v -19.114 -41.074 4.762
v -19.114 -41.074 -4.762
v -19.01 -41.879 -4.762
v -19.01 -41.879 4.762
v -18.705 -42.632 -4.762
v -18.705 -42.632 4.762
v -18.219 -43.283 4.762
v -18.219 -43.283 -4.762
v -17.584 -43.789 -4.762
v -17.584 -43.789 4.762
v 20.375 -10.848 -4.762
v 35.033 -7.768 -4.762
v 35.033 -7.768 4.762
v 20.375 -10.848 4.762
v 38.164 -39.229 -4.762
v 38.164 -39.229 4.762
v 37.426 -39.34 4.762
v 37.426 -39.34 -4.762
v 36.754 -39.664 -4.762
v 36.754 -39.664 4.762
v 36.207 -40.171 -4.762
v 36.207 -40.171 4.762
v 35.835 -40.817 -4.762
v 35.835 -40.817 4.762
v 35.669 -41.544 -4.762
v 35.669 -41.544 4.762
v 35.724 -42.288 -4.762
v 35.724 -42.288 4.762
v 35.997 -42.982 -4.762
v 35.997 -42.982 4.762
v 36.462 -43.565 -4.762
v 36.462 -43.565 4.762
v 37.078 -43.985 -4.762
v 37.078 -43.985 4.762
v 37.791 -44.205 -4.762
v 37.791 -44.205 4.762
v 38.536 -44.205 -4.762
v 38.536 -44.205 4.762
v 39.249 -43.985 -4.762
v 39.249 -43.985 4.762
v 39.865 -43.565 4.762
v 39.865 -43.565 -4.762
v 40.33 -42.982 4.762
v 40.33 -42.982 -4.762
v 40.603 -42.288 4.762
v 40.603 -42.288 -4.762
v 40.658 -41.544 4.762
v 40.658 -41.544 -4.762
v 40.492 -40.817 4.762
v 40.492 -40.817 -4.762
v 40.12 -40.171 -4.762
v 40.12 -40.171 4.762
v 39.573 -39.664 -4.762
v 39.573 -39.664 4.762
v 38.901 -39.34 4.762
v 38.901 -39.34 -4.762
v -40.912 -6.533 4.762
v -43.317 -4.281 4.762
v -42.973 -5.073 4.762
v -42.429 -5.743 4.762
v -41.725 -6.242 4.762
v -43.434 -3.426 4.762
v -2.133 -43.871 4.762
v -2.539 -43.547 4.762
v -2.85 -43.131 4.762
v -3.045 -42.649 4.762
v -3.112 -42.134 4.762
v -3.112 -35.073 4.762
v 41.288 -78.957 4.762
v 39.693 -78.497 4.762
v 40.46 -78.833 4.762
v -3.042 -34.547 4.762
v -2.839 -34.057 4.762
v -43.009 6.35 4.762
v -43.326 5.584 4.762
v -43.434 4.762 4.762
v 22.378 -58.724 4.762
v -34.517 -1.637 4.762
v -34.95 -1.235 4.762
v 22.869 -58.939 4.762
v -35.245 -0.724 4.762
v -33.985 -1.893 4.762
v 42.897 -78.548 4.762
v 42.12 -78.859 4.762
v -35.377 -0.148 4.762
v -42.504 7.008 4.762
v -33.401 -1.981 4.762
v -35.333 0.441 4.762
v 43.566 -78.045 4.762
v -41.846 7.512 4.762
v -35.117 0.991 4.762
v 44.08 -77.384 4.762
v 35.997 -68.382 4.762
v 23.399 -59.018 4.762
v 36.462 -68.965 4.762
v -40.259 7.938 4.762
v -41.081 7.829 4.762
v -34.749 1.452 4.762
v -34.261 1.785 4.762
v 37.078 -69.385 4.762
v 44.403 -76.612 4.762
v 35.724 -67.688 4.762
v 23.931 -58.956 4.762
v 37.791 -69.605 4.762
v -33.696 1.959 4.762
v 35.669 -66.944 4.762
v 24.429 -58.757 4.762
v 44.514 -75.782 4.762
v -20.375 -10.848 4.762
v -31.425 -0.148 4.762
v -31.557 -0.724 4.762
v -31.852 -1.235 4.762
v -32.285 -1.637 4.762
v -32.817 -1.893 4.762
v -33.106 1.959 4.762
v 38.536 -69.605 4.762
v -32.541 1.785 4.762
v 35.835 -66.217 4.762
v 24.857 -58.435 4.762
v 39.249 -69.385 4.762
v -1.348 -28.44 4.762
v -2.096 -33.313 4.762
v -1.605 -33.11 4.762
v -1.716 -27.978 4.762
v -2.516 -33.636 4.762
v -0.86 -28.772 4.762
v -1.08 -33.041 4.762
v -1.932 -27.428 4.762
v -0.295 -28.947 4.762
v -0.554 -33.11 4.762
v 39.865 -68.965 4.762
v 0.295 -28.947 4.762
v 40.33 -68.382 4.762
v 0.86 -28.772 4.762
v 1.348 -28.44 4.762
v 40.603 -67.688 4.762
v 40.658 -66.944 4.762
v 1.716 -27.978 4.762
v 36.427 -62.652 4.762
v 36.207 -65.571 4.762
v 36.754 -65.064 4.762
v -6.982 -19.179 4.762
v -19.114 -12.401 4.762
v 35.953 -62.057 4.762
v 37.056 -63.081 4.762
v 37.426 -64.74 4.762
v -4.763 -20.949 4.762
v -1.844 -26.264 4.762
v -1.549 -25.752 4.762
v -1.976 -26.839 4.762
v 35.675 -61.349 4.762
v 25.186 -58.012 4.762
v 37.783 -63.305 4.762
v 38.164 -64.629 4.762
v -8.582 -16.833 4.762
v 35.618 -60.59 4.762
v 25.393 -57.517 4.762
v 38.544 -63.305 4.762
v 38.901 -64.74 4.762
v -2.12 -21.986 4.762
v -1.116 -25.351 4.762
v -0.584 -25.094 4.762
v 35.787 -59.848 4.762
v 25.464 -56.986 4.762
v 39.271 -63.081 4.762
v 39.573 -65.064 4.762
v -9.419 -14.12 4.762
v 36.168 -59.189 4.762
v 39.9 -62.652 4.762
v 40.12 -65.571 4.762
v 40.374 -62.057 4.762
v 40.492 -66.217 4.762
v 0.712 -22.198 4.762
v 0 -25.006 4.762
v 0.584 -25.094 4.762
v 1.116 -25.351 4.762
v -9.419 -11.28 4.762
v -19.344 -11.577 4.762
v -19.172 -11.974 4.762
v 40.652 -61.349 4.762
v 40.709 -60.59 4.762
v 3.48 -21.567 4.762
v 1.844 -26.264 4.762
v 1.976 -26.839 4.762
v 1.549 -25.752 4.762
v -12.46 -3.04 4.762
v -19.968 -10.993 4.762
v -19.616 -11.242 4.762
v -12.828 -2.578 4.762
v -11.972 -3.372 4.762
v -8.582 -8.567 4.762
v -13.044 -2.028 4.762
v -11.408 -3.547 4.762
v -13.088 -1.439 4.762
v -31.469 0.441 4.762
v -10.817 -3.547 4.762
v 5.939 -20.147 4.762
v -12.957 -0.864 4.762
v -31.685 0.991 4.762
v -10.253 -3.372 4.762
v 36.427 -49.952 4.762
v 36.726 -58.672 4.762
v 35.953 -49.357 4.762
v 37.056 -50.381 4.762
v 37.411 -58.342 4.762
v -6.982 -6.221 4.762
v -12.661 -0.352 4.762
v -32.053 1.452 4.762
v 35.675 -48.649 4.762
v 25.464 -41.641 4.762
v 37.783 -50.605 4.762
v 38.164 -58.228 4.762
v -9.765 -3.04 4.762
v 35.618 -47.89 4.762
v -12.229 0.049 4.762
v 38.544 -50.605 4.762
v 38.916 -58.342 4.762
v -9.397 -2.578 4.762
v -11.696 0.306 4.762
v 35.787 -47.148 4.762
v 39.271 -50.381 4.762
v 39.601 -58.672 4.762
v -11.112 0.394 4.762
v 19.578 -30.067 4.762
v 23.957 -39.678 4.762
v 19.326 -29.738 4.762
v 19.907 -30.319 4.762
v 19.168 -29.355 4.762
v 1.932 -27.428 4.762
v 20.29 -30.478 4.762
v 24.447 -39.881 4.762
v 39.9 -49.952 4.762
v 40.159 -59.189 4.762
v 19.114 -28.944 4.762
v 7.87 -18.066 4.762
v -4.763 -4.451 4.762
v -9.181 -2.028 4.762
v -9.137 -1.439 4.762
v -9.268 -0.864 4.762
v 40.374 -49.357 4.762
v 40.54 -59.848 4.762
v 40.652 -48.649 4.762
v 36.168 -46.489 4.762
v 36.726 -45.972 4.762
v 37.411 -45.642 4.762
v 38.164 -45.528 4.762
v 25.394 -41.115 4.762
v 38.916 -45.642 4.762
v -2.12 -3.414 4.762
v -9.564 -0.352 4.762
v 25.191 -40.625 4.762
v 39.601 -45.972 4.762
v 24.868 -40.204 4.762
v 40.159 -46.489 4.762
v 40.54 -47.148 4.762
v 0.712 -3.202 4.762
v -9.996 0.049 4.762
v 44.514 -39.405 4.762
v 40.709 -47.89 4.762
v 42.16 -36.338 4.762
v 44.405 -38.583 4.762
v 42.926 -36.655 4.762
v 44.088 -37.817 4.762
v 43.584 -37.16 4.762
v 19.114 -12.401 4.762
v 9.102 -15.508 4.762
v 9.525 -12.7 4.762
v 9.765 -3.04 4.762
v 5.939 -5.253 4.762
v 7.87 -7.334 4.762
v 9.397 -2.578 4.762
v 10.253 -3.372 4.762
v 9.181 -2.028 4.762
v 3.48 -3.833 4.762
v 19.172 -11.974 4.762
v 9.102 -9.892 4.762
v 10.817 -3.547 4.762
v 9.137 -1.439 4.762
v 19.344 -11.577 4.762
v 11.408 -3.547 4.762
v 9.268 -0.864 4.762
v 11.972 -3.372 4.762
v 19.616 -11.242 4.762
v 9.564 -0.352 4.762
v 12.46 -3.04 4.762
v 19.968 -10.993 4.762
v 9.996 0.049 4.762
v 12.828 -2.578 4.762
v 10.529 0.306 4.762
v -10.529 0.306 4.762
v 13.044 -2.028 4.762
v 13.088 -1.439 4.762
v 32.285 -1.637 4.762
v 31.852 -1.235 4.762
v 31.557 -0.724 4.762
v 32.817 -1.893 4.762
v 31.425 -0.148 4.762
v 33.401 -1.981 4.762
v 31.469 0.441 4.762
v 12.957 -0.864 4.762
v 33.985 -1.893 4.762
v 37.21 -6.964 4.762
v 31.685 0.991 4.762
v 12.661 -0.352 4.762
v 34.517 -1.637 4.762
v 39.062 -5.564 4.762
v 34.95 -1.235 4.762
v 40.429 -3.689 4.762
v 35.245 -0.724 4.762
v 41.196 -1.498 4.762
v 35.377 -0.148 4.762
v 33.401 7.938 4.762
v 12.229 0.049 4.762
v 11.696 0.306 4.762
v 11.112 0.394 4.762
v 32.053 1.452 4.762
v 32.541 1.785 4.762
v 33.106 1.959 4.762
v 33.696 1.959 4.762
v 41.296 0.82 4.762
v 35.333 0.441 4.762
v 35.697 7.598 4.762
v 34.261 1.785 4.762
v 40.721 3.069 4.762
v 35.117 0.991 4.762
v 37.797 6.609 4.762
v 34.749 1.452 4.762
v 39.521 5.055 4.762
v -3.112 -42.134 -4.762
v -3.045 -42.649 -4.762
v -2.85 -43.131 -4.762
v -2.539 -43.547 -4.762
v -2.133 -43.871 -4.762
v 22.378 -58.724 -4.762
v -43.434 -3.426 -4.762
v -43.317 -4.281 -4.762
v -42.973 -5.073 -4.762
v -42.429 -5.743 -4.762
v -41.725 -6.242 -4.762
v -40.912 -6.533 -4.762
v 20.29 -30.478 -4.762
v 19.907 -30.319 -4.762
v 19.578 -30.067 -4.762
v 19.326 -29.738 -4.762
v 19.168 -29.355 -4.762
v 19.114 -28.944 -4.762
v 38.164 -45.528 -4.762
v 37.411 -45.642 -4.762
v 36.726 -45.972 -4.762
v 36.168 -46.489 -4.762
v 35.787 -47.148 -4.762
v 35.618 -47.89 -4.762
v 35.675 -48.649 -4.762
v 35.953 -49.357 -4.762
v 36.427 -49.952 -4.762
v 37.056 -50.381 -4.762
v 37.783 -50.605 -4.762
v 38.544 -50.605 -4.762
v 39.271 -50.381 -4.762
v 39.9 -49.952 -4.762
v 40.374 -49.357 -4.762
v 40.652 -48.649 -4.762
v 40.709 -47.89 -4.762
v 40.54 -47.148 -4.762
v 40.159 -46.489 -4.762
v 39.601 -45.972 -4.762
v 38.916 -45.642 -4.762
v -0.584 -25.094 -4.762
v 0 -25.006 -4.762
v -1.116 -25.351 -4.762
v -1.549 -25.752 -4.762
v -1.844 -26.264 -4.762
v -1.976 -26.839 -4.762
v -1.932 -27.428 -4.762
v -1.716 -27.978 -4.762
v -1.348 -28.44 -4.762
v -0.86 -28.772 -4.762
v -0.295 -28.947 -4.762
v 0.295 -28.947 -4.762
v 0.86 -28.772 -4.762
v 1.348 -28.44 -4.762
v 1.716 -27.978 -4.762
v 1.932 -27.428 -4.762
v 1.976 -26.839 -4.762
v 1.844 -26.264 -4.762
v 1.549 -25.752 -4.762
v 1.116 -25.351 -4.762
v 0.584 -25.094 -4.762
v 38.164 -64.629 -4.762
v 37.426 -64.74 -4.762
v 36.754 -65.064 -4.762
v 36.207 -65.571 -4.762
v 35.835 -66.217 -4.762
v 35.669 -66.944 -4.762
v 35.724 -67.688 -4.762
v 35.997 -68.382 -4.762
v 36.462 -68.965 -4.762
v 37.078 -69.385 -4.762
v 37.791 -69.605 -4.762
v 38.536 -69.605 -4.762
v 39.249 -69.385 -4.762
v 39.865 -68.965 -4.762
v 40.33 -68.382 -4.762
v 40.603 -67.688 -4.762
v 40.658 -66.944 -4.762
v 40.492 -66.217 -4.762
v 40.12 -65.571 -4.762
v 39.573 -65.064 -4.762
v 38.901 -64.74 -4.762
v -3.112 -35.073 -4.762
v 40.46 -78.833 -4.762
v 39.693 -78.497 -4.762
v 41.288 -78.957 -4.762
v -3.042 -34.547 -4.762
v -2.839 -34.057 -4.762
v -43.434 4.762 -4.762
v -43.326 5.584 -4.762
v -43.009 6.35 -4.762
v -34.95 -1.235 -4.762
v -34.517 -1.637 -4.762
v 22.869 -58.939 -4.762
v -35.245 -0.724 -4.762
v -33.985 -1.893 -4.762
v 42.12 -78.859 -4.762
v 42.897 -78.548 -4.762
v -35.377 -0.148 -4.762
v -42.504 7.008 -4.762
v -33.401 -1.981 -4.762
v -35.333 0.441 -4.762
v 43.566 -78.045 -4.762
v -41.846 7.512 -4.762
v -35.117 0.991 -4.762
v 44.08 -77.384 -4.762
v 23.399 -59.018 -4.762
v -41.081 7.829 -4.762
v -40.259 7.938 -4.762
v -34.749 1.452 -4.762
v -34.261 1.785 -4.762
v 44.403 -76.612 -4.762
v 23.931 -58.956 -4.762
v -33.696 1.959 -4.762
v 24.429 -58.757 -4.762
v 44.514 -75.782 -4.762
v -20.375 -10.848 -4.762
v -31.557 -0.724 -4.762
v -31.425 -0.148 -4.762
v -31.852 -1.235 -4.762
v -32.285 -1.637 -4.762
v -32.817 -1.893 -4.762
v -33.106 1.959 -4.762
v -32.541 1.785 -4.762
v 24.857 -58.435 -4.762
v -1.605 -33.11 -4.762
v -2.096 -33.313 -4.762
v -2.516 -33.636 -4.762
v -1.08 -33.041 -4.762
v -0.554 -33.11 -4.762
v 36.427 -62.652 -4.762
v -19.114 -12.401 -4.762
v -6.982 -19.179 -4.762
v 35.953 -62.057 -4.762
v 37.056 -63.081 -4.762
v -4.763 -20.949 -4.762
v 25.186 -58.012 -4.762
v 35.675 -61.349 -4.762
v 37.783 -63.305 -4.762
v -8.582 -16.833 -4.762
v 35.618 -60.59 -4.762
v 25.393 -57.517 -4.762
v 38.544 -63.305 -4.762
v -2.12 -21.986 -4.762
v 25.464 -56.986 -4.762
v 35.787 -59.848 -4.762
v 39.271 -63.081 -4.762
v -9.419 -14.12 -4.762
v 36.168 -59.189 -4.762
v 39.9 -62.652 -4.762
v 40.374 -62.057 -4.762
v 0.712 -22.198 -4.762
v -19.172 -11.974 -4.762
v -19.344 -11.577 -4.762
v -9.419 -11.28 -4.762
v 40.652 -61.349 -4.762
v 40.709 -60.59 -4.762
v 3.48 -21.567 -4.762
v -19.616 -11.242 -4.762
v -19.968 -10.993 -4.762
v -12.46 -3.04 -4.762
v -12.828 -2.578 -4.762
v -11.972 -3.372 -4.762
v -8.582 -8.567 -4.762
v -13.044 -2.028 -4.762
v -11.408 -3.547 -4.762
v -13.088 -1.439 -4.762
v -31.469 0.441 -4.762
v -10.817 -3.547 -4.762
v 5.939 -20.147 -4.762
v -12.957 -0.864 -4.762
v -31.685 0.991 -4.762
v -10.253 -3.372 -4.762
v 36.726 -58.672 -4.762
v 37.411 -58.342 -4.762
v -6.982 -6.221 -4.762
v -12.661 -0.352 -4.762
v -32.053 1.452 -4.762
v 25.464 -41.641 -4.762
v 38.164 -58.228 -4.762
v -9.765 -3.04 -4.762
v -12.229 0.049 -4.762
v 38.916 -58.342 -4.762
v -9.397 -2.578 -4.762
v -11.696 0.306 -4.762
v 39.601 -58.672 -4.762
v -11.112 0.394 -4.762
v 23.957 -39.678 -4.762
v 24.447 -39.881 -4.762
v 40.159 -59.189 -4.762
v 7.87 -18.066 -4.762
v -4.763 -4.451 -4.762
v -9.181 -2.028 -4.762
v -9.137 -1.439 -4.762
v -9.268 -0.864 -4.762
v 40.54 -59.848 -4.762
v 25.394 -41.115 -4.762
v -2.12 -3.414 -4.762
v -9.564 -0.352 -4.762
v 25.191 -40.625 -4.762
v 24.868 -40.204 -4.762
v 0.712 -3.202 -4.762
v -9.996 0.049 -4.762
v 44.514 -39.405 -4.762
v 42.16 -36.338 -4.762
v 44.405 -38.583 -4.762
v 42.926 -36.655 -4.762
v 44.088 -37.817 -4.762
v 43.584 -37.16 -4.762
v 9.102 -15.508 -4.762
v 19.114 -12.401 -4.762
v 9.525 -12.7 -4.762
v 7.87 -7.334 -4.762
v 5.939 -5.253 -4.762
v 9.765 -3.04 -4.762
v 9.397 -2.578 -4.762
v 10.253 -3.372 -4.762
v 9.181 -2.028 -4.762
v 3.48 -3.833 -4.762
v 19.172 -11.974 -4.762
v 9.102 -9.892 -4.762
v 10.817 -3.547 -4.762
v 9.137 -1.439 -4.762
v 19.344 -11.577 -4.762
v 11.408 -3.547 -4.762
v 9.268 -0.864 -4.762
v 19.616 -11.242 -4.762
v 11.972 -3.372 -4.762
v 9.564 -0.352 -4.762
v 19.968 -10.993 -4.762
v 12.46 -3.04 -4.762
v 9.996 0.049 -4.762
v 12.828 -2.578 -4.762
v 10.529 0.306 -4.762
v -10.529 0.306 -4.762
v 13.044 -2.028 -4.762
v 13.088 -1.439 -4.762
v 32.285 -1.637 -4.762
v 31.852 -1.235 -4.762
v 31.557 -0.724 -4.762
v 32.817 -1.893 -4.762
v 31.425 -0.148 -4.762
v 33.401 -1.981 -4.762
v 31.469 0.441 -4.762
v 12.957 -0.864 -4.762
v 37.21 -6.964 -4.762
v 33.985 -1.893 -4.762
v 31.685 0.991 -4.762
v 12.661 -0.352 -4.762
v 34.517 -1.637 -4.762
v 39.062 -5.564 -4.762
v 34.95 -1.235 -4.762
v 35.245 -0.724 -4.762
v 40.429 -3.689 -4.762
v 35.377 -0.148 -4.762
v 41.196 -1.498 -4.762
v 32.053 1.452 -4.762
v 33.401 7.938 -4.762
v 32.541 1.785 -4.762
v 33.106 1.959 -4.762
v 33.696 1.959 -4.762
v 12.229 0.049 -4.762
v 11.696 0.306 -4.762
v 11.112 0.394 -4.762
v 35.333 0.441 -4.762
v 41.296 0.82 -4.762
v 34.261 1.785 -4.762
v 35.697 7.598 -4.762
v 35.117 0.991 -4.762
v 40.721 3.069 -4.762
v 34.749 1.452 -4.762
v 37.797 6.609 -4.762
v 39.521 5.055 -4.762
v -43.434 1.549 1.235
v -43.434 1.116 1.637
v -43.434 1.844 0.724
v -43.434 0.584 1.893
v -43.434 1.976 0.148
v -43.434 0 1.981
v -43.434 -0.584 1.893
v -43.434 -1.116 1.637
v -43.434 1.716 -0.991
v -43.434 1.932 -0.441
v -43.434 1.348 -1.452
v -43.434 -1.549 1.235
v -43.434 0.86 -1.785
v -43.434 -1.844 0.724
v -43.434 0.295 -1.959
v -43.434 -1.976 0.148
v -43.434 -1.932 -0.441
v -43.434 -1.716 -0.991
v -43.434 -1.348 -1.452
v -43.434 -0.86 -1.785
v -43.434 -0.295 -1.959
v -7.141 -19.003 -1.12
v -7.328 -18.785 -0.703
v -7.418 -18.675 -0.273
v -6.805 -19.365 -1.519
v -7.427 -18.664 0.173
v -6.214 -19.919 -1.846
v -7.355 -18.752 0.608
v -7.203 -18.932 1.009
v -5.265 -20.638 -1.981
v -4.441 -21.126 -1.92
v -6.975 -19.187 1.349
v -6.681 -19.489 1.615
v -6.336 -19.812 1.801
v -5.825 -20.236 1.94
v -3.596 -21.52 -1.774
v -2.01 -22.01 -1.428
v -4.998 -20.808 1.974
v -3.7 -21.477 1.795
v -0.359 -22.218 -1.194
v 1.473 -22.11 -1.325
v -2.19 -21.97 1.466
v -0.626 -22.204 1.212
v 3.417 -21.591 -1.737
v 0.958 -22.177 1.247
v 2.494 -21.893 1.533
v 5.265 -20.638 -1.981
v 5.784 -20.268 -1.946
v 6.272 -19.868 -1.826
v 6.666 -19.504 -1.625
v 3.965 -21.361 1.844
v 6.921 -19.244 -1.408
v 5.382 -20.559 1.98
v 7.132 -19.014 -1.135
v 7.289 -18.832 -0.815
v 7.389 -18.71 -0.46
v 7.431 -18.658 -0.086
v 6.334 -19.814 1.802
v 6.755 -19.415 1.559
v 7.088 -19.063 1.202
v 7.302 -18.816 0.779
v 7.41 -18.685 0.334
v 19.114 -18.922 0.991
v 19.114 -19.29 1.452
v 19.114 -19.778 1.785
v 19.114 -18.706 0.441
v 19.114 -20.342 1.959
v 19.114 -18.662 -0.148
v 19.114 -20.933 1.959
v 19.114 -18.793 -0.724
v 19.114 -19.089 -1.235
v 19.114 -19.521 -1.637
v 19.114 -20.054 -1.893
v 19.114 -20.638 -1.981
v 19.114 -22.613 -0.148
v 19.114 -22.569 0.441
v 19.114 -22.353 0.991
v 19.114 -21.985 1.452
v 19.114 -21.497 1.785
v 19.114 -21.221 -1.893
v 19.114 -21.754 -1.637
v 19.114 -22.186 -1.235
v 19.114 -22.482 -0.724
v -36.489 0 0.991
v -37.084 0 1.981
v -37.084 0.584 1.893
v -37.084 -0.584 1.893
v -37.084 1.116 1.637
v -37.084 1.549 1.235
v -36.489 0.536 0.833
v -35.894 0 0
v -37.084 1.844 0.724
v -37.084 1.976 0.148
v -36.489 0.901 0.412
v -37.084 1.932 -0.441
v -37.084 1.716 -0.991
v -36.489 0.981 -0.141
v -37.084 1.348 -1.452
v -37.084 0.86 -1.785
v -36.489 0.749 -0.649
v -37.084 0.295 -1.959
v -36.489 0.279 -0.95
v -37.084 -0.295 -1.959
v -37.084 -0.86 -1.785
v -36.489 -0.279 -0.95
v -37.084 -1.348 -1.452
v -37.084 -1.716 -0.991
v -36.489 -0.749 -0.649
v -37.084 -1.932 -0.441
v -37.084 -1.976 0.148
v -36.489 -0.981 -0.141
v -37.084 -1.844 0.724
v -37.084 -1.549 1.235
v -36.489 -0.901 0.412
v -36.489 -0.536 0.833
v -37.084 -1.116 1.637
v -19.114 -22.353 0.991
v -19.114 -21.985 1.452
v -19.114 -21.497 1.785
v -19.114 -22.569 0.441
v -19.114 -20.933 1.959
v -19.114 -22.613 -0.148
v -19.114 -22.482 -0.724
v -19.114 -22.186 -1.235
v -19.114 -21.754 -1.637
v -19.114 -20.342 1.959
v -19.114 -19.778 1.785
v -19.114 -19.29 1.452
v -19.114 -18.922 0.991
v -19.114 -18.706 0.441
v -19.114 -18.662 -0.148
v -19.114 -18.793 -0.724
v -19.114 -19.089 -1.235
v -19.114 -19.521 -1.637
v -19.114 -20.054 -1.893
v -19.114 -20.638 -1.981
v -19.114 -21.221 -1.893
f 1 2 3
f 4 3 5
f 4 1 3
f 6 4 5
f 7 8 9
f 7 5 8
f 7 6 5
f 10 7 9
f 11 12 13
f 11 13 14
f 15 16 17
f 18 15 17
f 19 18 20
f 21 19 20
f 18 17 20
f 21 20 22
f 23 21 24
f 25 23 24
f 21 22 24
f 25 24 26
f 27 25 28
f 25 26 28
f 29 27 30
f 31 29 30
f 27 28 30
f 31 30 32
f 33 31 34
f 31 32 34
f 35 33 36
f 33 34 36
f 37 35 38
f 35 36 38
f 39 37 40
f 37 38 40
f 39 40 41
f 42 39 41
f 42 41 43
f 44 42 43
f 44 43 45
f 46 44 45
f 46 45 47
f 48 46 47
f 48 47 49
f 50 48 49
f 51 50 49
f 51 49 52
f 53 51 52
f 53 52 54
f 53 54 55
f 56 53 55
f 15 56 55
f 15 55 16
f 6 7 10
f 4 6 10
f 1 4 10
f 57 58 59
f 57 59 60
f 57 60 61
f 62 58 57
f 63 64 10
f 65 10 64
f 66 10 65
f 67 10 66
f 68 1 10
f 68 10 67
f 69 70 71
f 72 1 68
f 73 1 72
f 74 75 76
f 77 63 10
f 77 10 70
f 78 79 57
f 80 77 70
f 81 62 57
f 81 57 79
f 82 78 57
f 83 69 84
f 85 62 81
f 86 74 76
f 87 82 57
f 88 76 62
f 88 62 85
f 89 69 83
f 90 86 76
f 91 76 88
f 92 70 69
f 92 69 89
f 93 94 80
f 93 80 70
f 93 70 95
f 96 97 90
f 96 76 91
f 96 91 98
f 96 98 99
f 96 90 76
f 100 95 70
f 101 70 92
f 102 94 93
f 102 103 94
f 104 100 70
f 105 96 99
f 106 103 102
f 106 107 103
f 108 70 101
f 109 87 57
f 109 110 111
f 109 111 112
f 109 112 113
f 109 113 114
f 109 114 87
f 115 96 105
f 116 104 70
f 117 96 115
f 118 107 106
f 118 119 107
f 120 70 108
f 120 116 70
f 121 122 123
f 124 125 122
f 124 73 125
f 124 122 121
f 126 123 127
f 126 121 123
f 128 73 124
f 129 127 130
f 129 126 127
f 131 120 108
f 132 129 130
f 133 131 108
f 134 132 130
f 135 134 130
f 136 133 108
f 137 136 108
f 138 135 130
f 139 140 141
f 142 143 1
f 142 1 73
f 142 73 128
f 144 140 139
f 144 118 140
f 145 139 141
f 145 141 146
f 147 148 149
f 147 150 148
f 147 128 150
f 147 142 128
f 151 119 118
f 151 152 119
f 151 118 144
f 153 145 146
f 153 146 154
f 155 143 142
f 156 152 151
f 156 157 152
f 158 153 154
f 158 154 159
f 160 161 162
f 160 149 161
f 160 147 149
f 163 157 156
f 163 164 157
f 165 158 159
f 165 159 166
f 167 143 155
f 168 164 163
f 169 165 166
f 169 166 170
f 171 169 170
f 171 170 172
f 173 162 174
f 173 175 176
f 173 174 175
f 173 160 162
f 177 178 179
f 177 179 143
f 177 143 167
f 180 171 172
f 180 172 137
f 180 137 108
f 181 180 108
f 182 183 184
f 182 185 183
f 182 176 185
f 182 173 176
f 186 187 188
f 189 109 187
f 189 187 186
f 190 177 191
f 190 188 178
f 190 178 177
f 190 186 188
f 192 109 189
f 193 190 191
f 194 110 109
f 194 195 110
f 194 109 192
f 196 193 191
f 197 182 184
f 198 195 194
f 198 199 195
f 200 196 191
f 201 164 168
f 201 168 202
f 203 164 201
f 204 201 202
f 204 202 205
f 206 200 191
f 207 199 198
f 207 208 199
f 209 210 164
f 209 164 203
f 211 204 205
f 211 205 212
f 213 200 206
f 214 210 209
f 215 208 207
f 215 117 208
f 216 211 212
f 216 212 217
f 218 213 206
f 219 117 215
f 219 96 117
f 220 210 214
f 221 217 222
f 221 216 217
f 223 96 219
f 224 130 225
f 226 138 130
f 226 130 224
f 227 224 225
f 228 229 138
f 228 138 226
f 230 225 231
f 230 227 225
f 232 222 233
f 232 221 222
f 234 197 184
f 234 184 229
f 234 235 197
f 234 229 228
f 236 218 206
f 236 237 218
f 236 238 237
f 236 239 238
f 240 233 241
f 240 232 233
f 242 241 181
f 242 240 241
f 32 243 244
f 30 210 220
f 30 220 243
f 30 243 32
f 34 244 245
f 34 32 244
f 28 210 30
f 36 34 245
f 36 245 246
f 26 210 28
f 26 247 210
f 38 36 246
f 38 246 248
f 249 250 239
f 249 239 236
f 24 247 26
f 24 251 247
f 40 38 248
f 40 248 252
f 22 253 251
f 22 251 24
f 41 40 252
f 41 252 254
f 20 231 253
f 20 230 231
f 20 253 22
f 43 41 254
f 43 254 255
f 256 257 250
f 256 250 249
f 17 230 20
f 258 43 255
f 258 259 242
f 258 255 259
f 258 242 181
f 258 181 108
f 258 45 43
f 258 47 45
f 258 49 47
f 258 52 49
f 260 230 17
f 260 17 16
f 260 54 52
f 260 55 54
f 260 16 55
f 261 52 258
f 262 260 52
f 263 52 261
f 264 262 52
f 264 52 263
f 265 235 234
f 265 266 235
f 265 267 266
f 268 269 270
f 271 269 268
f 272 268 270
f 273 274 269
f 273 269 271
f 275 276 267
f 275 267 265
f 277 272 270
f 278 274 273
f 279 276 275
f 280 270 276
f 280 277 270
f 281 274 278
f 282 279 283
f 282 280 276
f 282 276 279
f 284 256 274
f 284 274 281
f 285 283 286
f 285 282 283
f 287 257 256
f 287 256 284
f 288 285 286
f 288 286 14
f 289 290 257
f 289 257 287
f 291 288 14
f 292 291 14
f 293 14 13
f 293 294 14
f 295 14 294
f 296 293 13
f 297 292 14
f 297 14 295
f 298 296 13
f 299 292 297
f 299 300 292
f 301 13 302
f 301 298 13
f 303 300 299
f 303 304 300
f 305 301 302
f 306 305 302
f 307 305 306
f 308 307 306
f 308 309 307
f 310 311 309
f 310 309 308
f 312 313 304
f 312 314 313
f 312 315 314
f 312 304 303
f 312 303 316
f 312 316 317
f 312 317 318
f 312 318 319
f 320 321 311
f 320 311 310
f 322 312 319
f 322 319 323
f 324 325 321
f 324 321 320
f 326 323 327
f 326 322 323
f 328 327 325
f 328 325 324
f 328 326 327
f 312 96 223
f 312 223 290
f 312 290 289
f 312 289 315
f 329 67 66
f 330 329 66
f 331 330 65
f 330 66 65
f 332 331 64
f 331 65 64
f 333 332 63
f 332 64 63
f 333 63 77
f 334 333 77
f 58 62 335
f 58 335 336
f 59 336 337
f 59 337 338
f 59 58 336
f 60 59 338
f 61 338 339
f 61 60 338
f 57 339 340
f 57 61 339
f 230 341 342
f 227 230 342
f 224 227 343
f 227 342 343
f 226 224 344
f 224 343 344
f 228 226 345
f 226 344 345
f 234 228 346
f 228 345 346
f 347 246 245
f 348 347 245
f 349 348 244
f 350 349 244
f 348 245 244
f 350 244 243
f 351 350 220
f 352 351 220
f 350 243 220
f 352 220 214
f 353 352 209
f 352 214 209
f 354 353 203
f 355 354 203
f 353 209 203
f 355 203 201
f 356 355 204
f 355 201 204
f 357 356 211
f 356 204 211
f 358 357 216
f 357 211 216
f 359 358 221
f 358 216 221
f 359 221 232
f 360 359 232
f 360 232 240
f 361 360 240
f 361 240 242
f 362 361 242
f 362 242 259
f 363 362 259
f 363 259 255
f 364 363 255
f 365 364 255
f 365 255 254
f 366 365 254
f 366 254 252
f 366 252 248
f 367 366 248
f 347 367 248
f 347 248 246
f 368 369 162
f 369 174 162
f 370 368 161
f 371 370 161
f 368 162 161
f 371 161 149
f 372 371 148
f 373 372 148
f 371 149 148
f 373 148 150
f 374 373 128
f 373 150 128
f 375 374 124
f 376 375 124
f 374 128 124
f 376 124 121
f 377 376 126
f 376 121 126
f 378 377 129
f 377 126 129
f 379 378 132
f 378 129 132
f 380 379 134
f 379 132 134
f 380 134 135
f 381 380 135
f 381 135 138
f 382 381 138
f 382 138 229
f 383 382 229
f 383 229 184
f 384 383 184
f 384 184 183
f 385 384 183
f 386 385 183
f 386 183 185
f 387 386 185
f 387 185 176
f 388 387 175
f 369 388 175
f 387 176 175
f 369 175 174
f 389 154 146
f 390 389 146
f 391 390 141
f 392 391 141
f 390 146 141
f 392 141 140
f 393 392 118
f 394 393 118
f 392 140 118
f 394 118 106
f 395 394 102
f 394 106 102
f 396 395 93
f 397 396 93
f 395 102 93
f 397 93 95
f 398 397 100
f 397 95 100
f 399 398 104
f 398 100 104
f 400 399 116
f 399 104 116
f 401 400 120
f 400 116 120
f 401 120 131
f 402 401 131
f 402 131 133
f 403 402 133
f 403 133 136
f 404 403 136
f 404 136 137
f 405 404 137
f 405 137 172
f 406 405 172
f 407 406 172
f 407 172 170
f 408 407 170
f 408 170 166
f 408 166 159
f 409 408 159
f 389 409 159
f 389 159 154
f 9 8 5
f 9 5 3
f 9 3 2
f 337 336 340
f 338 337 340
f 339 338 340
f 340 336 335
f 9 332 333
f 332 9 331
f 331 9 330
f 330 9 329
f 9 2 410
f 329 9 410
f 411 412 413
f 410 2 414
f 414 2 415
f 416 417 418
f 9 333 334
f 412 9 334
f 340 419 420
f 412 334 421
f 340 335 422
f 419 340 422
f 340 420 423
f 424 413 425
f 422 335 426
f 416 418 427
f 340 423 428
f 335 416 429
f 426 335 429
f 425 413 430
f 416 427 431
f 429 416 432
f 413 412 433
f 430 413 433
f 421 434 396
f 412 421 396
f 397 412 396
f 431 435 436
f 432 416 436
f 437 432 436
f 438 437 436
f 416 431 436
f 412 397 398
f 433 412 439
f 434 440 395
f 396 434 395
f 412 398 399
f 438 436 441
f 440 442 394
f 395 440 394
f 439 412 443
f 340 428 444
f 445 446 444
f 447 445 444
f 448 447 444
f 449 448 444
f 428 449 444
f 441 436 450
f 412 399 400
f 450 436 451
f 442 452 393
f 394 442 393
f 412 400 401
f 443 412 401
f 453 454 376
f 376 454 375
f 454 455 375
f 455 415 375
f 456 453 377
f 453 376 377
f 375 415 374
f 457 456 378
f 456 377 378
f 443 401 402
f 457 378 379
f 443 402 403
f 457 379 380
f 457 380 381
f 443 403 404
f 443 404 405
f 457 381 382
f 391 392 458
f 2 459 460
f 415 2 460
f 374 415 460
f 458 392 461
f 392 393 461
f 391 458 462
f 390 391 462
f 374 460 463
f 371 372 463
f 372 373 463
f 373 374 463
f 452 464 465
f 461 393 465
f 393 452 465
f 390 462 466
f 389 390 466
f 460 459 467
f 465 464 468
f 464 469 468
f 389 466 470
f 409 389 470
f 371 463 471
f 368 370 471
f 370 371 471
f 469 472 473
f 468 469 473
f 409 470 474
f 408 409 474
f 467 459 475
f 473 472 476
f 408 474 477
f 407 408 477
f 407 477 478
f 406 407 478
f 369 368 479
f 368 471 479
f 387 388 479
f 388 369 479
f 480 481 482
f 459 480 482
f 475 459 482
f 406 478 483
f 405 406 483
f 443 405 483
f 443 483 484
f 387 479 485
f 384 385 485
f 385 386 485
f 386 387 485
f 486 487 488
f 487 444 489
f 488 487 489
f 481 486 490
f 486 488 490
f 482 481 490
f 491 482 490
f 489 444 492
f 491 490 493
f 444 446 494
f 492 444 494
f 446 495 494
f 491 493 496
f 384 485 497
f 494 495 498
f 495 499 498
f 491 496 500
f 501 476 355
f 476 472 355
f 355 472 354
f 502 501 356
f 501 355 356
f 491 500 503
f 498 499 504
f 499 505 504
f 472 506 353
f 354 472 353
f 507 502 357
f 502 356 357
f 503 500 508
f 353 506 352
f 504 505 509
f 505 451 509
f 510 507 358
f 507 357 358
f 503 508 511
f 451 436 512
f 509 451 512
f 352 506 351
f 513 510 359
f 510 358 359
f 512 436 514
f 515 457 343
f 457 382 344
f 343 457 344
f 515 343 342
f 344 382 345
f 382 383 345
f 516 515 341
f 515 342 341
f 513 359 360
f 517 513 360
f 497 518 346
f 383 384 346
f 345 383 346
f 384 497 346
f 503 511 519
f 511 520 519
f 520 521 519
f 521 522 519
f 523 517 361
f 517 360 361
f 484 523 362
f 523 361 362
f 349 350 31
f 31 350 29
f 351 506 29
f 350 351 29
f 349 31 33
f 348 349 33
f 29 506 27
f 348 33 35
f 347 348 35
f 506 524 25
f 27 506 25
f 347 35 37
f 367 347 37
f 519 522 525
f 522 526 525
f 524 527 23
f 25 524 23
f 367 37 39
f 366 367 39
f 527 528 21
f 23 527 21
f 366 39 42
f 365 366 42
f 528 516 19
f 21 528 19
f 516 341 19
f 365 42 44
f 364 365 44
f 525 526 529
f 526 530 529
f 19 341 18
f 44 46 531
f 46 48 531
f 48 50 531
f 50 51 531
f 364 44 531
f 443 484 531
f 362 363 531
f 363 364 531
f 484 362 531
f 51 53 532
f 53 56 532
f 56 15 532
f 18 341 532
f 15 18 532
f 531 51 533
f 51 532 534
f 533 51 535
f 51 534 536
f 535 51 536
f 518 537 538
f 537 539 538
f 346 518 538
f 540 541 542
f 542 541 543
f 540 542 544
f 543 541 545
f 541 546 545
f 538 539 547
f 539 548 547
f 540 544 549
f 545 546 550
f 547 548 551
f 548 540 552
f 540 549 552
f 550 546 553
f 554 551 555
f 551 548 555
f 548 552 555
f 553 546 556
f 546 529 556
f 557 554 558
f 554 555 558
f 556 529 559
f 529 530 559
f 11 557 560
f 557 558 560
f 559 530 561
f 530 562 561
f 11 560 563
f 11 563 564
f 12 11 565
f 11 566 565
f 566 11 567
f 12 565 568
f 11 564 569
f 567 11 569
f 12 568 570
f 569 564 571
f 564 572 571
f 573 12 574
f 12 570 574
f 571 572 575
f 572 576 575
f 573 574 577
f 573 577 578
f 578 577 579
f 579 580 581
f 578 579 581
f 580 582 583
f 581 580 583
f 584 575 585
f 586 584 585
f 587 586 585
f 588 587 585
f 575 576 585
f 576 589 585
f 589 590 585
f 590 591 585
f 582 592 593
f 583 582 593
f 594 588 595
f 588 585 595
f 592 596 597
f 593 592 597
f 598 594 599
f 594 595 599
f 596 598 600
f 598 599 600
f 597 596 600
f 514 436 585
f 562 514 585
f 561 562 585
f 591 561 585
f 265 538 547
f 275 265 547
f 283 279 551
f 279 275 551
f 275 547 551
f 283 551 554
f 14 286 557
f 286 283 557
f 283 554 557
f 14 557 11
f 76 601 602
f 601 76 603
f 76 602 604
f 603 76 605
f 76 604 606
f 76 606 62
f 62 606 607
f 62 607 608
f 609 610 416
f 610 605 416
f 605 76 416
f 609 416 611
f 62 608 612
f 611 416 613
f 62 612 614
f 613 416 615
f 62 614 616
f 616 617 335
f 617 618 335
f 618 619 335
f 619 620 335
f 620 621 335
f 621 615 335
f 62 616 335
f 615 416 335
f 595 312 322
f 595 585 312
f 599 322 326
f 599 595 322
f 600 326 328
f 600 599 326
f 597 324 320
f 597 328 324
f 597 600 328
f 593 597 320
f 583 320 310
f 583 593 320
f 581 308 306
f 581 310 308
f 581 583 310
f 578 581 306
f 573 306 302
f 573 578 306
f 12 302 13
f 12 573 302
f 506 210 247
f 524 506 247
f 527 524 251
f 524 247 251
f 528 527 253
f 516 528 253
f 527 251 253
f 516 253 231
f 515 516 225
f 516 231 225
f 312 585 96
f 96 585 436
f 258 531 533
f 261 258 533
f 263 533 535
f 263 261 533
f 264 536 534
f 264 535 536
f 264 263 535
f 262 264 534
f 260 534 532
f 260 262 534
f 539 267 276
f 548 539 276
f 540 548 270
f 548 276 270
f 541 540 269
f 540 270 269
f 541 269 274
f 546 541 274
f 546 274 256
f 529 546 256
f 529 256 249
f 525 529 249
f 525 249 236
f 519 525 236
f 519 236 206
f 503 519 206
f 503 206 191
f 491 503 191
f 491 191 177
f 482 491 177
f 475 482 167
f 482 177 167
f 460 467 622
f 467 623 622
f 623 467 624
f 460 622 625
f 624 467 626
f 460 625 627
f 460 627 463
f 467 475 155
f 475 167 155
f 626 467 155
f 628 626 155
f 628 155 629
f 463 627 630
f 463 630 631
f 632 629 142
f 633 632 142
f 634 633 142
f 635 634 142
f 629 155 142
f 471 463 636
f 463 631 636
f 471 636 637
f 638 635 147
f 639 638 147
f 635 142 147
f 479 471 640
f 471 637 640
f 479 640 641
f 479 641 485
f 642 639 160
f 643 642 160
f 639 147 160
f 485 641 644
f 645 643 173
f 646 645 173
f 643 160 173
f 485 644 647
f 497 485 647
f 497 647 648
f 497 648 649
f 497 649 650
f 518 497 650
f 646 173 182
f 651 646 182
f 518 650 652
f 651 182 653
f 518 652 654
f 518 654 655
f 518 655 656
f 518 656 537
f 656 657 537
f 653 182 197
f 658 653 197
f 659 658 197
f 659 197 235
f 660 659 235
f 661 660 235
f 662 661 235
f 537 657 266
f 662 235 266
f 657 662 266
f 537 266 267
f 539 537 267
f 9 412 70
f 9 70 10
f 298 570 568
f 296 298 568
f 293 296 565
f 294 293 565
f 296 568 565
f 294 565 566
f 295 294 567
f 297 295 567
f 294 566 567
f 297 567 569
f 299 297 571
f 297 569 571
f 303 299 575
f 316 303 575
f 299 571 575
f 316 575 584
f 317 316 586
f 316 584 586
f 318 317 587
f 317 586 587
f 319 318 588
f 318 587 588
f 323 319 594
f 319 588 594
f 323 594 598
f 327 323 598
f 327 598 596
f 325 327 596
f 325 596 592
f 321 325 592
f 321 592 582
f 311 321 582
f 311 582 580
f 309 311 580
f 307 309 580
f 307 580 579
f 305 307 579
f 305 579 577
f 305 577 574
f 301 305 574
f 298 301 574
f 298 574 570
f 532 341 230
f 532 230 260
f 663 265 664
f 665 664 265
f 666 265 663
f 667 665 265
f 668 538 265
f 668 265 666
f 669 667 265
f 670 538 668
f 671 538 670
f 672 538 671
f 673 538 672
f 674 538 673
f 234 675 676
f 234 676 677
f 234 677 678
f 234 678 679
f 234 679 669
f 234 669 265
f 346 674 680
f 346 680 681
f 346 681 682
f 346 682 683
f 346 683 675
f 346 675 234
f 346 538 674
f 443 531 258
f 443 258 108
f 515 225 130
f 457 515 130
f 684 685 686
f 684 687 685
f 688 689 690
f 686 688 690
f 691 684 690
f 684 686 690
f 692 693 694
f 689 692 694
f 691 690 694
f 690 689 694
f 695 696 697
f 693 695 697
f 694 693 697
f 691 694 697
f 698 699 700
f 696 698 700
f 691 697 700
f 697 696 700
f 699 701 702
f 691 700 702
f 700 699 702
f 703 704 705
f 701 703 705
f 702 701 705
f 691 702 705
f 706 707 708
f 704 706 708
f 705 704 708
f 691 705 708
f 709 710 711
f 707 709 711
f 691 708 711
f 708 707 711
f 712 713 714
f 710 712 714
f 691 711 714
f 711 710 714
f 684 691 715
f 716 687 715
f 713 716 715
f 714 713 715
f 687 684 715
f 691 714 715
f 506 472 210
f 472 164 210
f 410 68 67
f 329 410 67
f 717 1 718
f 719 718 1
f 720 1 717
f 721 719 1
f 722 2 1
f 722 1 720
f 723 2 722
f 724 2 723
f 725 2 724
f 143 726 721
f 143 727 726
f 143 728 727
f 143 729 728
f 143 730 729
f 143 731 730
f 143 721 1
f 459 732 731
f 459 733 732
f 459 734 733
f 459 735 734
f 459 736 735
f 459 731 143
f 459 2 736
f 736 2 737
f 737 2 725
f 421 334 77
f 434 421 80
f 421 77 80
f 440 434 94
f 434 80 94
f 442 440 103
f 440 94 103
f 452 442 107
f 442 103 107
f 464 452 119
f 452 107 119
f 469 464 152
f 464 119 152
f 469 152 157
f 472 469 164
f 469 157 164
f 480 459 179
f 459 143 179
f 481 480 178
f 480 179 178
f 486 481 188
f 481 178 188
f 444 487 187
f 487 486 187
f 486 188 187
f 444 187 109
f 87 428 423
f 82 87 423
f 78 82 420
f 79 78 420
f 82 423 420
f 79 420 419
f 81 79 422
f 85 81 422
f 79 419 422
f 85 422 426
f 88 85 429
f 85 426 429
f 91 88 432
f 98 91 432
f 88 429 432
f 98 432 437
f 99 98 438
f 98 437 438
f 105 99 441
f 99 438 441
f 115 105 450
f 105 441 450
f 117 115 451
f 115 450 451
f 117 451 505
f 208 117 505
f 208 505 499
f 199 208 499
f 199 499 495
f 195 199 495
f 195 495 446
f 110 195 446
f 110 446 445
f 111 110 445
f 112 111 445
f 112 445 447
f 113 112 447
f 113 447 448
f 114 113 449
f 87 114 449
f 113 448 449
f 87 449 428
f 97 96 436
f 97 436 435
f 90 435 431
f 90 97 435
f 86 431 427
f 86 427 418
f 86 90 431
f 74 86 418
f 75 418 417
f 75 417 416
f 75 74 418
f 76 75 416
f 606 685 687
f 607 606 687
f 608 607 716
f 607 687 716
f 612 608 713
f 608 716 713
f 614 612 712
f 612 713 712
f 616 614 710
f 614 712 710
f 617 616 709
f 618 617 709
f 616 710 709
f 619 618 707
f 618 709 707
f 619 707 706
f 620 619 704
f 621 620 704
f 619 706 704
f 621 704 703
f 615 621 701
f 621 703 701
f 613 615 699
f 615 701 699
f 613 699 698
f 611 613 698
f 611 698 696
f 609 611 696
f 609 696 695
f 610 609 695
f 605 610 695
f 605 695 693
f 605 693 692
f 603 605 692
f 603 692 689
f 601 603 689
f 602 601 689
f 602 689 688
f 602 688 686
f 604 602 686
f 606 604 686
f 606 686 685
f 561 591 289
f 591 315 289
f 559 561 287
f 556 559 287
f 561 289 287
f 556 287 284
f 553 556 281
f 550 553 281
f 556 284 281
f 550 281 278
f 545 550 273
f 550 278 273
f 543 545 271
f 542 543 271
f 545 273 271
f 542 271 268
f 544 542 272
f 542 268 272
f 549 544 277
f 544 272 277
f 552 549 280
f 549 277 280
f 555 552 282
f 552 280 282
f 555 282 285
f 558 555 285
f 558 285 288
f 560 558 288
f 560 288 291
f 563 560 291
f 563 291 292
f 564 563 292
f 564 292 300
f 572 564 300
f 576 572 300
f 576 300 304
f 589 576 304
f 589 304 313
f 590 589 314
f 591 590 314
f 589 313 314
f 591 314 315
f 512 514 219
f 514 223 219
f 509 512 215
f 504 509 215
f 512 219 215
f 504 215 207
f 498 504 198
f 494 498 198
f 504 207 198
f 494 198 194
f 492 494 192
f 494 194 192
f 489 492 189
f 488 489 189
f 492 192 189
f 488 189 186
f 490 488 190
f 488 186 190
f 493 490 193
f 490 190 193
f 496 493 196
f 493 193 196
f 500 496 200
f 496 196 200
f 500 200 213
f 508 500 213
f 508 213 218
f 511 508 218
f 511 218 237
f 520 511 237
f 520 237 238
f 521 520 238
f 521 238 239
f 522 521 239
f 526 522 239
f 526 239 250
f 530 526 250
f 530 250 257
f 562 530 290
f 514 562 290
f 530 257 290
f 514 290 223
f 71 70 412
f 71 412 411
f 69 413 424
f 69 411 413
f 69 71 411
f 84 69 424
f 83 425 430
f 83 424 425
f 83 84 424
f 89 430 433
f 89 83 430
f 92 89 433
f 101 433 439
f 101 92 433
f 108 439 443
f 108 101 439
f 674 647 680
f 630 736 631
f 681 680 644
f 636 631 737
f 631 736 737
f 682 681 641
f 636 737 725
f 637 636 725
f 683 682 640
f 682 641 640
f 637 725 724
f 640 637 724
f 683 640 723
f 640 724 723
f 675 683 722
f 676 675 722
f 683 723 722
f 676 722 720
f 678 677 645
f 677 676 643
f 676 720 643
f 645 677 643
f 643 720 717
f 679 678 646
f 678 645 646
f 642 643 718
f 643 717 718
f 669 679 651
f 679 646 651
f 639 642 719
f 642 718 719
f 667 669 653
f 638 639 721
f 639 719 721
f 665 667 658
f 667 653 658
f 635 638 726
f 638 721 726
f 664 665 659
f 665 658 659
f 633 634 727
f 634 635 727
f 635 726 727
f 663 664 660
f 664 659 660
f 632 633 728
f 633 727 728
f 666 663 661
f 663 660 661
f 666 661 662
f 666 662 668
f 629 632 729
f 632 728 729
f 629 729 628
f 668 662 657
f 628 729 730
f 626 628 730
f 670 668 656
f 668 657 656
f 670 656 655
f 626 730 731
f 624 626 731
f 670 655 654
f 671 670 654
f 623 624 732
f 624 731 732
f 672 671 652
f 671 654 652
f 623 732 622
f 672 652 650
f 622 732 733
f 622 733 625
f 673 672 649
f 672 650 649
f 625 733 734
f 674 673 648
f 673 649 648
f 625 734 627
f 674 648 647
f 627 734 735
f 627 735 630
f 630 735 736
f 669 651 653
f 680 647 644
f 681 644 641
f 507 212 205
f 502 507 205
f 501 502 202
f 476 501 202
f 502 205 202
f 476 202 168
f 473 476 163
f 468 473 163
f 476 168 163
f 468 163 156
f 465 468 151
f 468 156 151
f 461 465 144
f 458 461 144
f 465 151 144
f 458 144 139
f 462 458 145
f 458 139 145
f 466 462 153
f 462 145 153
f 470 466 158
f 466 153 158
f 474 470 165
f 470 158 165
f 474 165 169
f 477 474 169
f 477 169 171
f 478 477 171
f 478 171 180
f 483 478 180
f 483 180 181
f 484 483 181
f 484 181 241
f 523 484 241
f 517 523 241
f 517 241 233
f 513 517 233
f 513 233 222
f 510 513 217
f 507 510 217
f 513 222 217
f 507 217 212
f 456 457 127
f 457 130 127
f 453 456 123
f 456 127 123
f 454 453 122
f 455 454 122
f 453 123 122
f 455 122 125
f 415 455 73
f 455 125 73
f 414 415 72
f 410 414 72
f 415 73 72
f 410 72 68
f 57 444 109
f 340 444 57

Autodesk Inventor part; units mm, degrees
ref_plane "YZ Plane" through (0, 0, 0) normal (1, 0, 0) x (0, 1, 0)
ref_plane "XZ Plane" through (0, 0, 0) normal (0, 1, 0) x (-1, 0, 0)
ref_plane "XY Plane" through (0, 0, 0) normal (0, 0, 1) x (1, 0, 0)
sketch "Sketch1" plane through (0, 0, 0) normal (0, 0, 1) x (1, 0, 0)
  line L0 (33.401, 0) -> (-33.401, 0) construction
  arc A0 (33.401, 7.9375) -> (35.033, -7.7679) centre (33.401, 0) ccw construction
  arc A1 (-35.033, -7.7679) -> (-33.401, 7.9375) centre (-33.401, 0) ccw construction
  line L1 (33.401, 7.9375) -> (-33.401, 7.9375)
  line L2 (35.033, -7.7679) -> (19.1135, -11.1125)
  line L3 (19.1135, -11.1125) -> (19.1135, -30.1625)
  line L4 (19.1135, -30.1625) -> (44.5135, -36.9684)
  line L5 (44.5135, -36.9684) -> (44.5135, -81.4184)
  line L6 (44.5135, -81.4184) -> (-19.1135, -42.8625)
  line L7 (-19.1135, -42.8625) -> (-19.1135, -11.1125)
  line L8 (-19.1135, -11.1125) -> (-43.434, -6.0029)
  arc A2 (35.033, -7.7679) -> (33.401, 7.9375) centre (33.401, 0) ccw
  arc A3 (-33.401, 7.9375) -> (-35.033, -7.7679) centre (-33.401, 0) ccw
  line L9 (0, 26.6914) -> (0, -99.4367) construction
  line L10 (-33.401, 7.9375) -> (-43.434, 7.9375)
  line L11 (-43.434, 7.9375) -> (-43.434, -6.0029)
  point P0 (0, 0)
  point P1 (0, 0)
  point P2 (19.1135, -20.6375)
  dimension "d24" = 50.927
  dimension "d25" = 7.9375
  dimension "d26" = 19.05
  dimension "d27" = 19.05
  dimension "d28" = 105
  dimension "d30" = 6.35
  dimension "d31" = 44.45
  dimension "d72" = 28.575
  dimension "d110" = 31.75
  dimension "d127" = 10.033
extrude "Extrusion2" add sketch "Sketch1" along normal mid plane 9.525
sketch "Sketch2" plane through (0, 0, 4.7625) normal (0, 0, 1) x (1, 0, 0)
  arc A0 (35.033, -7.7679) -> (33.401, 7.9375) centre (33.401, 0) ccw construction
  line L0 (33.401, 0) -> (-33.401, 0) construction
  point P0 (0, 0)
  point P1 (0, 0)
hole "Hole1" at (33.401, 0, 4.7625) at (-33.401, 0, 4.7625) direction (0, 0, -1) diameter 3.9624 end through all thread size "10-32 UNF" class "2B" standard "ANSI Unified Screw Threads"
sketch "Sketch3" plane through (0, 0, -4.7625) normal (0, 0, -1) x (-1, 0, 0)
  line L0 (-62.103, 0) -> (61.0235, 0) construction
  line L1 (0, -99.2896) -> (0, 25.8087) construction
  line L2 (11.1125, -1.5875) -> (-11.1125, -1.5875) construction
  line L3 (0, -26.9875) -> (0, -1.5875) construction
  point P0 (0, 0)
  dimension "d43" = 22.225
  dimension "d44" = 25.4
  dimension "d45" = 1.5875
hole "Hole2" at (0, -26.9875, -4.7625) at (11.1125, -1.5875, -4.7625) at (-11.1125, -1.5875, -4.7625) direction (0, 0, 1) diameter 3.9624 end through all thread size "10-32 UNF" class "2B" standard "ANSI Unified Screw Threads"
sketch "Sketch4" plane through (0, 0, 4.7625) normal (0, 0, 1) x (1, 0, 0)
  line L0 (0, 0) -> (0, -12.7) construction
  circle A0 centre (0, -12.7) radius 9.525
  line L1 (25.4635, -56.9863) -> (25.4635, -41.6407)
  line L2 (23.9574, -39.6779) -> (-0.5536, -33.1102)
  line L3 (-3.1115, -35.073) -> (-3.1115, -42.1335)
  line L4 (-2.1326, -43.8713) -> (22.3784, -58.7242)
  line L5 (-19.1135, -42.8625) -> (44.5135, -81.4184) construction
  line L6 (44.5135, -36.9684) -> (19.1135, -30.1625) construction
  line L7 (44.5135, -81.4184) -> (44.5135, -36.9684) construction
  arc A1 (22.3784, -58.7242) -> (25.4635, -56.9863) centre (23.4315, -56.9863) ccw
  arc A2 (25.4635, -41.6407) -> (23.9574, -39.6779) centre (23.4315, -41.6407) ccw
  arc A3 (-0.5536, -33.1102) -> (-3.1115, -35.073) centre (-1.0795, -35.073) ccw
  arc A4 (-3.1115, -42.1335) -> (-2.1326, -43.8713) centre (-1.0795, -42.1335) ccw
  point P0 (-18.2864, -30.0929)
  point P1 (20.2266, -29.9445)
  point P2 (19.1135, -30.1625)
  dimension "d54" = 19.05
  dimension "d55" = 12.7
  dimension "d56" = 19.05
  dimension "d57" = 28.575
  dimension "d58" = 7.9375
  dimension "d59" = 7.9375
  dimension "d60" = 2.032
extrude "Extrusion3" cut sketch "Sketch4" against normal through all
sketch "Sketch6" plane through (19.1135, -30.1625, 4.7625) normal (1, 0, 0) x (0, 0, -1)
  line L0 (9.525, 19.05) -> (0, 19.05) construction
  line L1 (0, 0) -> (0, 19.05) construction
  line L2 (9.525, 0) -> (0, 0) construction
  line L3 (9.525, 19.05) -> (9.525, 0) construction
  line L4 (9.525, 0) -> (0, 19.05) construction
  point P0 (4.7625, 30.1625)
  point P1 (4.7625, 9.525)
hole "Hole3" at (19.1135, -20.6375, 0) direction (-1, 0, 0) diameter 3.9624 end through all thread size "10-32 UNF" class "2B" standard "ANSI Unified Screw Threads"
sketch "Sketch8" plane through (0, 0, -4.7625) normal (0, 0, -1) x (-1, 0, 0)
  line L0 (-38.1635, -41.7309) -> (-38.1635, -48.0809) construction
  line L1 (-38.1635, -48.0809) -> (-38.1635, -60.7809) construction
  line L2 (-38.1635, -60.7809) -> (-38.1635, -67.1309) construction
  line L3 (-44.5135, -36.9684) -> (-44.5135, -81.4184) construction
  point P0 (0, 0)
  point P1 (-44.5135, -59.1934)
  point P2 (-38.1635, -54.4309)
  dimension "d85" = 12.7
  dimension "d86" = 25.4
  dimension "d88" = 4.7625
  dimension "d89" = 6.35
hole "Hole5" at (38.1635, -67.1309, -4.7625) at (38.1635, -41.7309, -4.7625) direction (0, 0, 1) diameter 5.0038 end through all clearance for "H7 - STANDARD FIT" size "5" standard "CL-DOWEL-MET"
hole "Hole6" at (38.1635, -48.0809, -4.7625) at (38.1635, -60.7809, -4.7625) direction (0, 0, 1) diameter 5.1054 end through all clearance for "Flat Head Machine Screw (82)" size "#10" standard "Ansi Unified Screw Threads"
fillet "Fillet4" radius 1.5875 3 edges at (19.1135, -30.1625, 0) (19.1135, -11.1125, 0) (-19.1135, -11.1125, 0)
fillet "Fillet5" radius 3.175 5 edges at (44.5135, -36.9684, 0) (44.5135, -81.4184, 0) (-19.1135, -42.8625, 0) (-43.434, -6.0029, 0) (-43.434, 7.9375, 0)
sketch "Sketch11" plane through (-43.434, -3.4256, -4.7625) normal (-1, 0, 0) x (0, 0, 1)
  point P0 (4.7625, 3.4256)
  point P1 (4.7625, 3.4256)
hole "Hole9" at (-43.434, 0, 0) direction (1, 0, 0) diameter 3.9624 depth 6.35 tip angle 118 thread size "10-32 UNF" class "2B" standard "ANSI Unified Screw Threads"
equation "\"d58\" = d59"
equation "\"BendRadius\" = Thickness"
equation "\"BendReliefWidth\" = Thickness"
equation "\"BendReliefDepth\" = 0.5 * Thickness"
equation "\"CornerReliefSize\" = 4 * Thickness"
equation "\"MinimumRemnant\" = 2 * Thickness"
equation "\"TransitionRadius\" = BendRadius"
equation "\"JacobiRadiusSize\" = BendRadius"
equation "\"GapSize\" = Thickness"
equation "\"Thickness\" = 6.35"
properties part number "PLATE,SIDE,ELEVATOR,STAGE1" material "Aluminum 7075"
